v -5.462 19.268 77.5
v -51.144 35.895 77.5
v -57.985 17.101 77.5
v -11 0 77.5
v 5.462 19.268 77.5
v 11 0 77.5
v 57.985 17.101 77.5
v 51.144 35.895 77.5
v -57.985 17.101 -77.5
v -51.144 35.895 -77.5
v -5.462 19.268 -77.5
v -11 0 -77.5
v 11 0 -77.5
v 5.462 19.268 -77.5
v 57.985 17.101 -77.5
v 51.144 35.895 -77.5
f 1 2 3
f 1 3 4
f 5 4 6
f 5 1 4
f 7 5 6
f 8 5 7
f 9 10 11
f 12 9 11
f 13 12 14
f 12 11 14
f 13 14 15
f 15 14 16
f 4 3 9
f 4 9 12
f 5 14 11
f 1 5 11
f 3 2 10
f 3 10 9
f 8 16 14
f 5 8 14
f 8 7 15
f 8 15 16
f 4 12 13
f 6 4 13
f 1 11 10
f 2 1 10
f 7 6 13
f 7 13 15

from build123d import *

# Parameters (mm, degrees)
BOSS_EXTRUDE2_DEPTH      = 77.5
BOSS_EXTRUDE2_DEPTH_BACK = 77.5


with BuildPart() as part:
    # Sketch7 → Boss-Extrude2 (new, two sides: drawn at the far end of the back side and taken through both)
    with BuildSketch(Plane.XY.offset(-BOSS_EXTRUDE2_DEPTH_BACK)):
        Polygon((-11, 0), (11, 0), (57.984631039, 17.101007166), (51.144228173, 35.894859582), (5.462206168, 19.267963331), (-5.462206168, 19.267963331), (-51.144228173, 35.894859582), (-57.984631039, 17.101007166), align=None)
    extrude(amount=BOSS_EXTRUDE2_DEPTH + BOSS_EXTRUDE2_DEPTH_BACK)


solid = part.part
